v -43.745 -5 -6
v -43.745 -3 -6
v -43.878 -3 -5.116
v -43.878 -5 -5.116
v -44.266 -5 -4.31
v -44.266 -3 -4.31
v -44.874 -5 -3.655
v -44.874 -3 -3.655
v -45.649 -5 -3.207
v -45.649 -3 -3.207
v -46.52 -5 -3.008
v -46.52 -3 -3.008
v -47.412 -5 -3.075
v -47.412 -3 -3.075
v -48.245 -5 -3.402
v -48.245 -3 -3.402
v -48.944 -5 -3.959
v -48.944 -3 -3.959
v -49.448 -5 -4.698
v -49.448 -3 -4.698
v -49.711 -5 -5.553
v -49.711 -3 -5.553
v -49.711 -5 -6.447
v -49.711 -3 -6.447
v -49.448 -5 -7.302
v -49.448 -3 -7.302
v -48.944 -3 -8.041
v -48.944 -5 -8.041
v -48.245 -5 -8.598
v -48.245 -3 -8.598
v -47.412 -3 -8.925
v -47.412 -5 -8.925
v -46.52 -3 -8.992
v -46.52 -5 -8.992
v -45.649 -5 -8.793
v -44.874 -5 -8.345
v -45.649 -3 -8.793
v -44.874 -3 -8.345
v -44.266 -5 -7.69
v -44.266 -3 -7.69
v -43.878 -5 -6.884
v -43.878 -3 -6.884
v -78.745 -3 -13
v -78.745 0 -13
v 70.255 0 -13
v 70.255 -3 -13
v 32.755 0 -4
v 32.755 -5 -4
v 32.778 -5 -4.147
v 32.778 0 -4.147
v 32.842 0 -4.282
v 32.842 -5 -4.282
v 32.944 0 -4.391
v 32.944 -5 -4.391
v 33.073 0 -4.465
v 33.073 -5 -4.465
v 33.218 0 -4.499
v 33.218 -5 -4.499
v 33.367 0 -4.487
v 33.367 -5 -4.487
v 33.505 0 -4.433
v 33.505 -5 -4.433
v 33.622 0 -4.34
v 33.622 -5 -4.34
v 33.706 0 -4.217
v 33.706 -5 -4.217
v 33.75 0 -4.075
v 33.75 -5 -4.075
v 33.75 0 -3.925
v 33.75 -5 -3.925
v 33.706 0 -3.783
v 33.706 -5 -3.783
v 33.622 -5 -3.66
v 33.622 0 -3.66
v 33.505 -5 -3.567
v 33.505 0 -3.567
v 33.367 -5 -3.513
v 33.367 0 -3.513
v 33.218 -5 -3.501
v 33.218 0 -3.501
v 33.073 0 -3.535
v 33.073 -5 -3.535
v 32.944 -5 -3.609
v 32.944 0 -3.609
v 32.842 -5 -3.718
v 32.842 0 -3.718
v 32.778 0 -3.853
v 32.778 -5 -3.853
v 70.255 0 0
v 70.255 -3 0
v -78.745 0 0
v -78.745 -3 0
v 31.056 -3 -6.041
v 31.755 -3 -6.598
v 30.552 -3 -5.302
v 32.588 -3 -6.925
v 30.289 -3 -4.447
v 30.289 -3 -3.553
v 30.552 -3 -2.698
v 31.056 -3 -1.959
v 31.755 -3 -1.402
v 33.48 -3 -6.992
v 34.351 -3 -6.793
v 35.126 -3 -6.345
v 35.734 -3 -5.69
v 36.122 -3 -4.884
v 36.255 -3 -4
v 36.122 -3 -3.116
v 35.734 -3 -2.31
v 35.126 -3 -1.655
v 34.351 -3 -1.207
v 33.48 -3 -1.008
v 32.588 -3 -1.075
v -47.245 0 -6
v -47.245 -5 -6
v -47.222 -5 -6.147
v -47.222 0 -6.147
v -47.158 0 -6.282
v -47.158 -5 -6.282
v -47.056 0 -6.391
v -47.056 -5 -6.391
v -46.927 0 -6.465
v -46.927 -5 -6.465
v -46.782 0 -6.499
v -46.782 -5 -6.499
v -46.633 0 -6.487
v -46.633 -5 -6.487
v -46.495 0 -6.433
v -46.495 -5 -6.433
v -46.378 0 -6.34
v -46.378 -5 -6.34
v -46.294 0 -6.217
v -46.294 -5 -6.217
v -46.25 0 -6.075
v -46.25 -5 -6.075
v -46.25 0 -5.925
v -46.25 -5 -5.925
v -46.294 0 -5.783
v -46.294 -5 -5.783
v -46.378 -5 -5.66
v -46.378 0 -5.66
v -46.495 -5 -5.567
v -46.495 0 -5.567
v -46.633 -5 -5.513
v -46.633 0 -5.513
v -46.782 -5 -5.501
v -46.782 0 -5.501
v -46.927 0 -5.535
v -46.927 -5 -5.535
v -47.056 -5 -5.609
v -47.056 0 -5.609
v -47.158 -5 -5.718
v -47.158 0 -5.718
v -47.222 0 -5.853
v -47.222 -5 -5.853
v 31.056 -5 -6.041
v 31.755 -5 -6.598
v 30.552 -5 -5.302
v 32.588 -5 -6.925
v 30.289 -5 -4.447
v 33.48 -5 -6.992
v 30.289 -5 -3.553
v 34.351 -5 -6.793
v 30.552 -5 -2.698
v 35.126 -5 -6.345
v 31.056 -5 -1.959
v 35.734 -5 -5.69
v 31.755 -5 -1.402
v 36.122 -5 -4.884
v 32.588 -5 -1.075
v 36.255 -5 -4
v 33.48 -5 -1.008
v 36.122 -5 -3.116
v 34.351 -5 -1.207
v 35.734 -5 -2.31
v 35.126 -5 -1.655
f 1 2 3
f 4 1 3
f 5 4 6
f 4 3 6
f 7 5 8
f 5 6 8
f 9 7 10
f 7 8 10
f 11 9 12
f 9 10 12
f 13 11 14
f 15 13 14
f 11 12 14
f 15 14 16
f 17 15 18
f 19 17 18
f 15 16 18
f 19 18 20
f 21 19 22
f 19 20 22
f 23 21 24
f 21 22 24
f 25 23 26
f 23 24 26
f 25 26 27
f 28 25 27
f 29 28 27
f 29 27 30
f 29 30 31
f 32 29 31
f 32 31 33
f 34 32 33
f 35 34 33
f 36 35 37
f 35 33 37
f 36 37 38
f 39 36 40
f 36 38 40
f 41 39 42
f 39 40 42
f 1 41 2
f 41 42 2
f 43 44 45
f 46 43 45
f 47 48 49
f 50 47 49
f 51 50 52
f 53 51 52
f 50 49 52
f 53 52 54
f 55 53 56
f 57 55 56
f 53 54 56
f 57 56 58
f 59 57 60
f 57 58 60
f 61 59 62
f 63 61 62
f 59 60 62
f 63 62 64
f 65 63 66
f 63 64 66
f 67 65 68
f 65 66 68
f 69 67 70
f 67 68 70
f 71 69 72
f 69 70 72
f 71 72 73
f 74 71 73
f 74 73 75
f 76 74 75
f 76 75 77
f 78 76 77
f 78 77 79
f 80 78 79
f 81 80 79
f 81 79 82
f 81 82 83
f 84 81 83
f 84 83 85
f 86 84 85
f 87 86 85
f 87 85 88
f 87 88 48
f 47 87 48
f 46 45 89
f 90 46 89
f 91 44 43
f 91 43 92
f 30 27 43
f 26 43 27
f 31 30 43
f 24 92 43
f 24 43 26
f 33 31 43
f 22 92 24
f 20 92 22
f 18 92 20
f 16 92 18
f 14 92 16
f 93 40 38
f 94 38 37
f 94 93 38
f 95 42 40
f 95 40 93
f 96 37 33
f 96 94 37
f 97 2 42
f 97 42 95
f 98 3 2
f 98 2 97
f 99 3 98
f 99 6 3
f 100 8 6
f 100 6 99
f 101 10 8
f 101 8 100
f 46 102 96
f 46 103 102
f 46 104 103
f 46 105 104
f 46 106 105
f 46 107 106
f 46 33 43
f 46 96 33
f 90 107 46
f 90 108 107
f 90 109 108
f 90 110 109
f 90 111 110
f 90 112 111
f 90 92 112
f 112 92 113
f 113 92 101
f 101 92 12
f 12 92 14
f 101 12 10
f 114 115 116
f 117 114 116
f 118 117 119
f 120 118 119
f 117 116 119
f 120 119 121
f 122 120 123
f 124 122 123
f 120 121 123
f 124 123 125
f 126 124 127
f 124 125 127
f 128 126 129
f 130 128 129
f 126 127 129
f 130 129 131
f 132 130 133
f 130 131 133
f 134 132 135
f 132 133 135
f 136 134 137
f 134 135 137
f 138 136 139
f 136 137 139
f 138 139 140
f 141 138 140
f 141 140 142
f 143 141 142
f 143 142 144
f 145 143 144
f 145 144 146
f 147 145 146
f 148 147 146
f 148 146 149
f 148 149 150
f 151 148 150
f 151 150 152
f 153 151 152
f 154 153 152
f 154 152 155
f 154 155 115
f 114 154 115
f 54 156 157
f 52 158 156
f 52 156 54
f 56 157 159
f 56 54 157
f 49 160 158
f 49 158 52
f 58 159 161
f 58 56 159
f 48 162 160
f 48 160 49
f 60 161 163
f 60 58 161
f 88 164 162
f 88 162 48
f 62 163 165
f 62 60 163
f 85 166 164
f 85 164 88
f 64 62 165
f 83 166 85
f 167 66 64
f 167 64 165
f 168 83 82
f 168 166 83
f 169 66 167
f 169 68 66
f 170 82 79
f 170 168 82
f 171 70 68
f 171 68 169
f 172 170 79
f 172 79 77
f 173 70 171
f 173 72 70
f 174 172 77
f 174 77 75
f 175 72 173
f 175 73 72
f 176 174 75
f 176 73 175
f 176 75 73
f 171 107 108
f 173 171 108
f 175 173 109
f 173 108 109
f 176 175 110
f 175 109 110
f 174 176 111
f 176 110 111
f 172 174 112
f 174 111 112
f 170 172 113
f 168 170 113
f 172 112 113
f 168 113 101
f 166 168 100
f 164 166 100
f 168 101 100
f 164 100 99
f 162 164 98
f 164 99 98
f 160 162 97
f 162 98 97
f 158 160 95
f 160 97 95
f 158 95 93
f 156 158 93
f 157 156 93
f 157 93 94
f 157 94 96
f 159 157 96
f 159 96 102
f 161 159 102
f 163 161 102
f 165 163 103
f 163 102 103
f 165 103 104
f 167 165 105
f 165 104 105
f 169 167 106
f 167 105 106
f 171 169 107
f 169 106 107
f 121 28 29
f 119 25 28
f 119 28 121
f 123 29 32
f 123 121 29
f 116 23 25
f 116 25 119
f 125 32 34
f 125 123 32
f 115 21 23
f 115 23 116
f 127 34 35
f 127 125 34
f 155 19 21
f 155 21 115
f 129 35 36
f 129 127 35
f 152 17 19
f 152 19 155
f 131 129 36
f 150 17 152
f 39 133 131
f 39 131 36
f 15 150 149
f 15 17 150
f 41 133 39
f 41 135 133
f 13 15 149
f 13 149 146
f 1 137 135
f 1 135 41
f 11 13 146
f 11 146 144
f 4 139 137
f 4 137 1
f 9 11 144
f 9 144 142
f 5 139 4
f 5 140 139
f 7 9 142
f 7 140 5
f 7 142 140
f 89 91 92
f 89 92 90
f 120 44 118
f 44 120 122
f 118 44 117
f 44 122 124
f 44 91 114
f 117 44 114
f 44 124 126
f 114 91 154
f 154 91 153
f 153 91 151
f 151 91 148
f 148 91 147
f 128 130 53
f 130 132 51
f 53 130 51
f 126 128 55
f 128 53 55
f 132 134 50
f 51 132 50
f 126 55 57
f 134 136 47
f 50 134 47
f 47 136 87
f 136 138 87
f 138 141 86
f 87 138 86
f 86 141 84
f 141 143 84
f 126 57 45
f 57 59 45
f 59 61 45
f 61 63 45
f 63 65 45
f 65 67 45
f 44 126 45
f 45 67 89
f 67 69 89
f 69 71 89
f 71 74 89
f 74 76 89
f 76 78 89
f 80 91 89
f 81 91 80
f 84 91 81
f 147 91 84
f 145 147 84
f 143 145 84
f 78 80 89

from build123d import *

# Parameters (mm, degrees)
F0_W     = 149
F0_H     = 13
F1_DEPTH = 3
F2_R     = 3
F3_DEPTH = 2
F4_D     = 1


with BuildPart() as f1:
    # F0 (on Front) → F1 (new body)
    with BuildSketch(Plane.XZ):
        with Locations((-4.2446807389, -6.5)):
            Rectangle(F0_W, F0_H)
    extrude(amount=F1_DEPTH)

    # F2 (on face) → F3 (join)
    with BuildSketch(Plane.XZ.offset(3)):
        with Locations((-46.7446807389, -6)):
            Circle(F2_R)
        with Locations((33.2553192611, -4)):
            Circle(F2_R)
    extrude(amount=F3_DEPTH)

    # F4 (through all)
    with Locations(Plane(origin=(0, 0, 0), x_dir=(1, 0, 0), z_dir=(0, 1, 0))):
        with Locations((-46.7446807389, 6), (33.2553192611, 4)):
            Hole(F4_D / 2)


solid = f1.part
